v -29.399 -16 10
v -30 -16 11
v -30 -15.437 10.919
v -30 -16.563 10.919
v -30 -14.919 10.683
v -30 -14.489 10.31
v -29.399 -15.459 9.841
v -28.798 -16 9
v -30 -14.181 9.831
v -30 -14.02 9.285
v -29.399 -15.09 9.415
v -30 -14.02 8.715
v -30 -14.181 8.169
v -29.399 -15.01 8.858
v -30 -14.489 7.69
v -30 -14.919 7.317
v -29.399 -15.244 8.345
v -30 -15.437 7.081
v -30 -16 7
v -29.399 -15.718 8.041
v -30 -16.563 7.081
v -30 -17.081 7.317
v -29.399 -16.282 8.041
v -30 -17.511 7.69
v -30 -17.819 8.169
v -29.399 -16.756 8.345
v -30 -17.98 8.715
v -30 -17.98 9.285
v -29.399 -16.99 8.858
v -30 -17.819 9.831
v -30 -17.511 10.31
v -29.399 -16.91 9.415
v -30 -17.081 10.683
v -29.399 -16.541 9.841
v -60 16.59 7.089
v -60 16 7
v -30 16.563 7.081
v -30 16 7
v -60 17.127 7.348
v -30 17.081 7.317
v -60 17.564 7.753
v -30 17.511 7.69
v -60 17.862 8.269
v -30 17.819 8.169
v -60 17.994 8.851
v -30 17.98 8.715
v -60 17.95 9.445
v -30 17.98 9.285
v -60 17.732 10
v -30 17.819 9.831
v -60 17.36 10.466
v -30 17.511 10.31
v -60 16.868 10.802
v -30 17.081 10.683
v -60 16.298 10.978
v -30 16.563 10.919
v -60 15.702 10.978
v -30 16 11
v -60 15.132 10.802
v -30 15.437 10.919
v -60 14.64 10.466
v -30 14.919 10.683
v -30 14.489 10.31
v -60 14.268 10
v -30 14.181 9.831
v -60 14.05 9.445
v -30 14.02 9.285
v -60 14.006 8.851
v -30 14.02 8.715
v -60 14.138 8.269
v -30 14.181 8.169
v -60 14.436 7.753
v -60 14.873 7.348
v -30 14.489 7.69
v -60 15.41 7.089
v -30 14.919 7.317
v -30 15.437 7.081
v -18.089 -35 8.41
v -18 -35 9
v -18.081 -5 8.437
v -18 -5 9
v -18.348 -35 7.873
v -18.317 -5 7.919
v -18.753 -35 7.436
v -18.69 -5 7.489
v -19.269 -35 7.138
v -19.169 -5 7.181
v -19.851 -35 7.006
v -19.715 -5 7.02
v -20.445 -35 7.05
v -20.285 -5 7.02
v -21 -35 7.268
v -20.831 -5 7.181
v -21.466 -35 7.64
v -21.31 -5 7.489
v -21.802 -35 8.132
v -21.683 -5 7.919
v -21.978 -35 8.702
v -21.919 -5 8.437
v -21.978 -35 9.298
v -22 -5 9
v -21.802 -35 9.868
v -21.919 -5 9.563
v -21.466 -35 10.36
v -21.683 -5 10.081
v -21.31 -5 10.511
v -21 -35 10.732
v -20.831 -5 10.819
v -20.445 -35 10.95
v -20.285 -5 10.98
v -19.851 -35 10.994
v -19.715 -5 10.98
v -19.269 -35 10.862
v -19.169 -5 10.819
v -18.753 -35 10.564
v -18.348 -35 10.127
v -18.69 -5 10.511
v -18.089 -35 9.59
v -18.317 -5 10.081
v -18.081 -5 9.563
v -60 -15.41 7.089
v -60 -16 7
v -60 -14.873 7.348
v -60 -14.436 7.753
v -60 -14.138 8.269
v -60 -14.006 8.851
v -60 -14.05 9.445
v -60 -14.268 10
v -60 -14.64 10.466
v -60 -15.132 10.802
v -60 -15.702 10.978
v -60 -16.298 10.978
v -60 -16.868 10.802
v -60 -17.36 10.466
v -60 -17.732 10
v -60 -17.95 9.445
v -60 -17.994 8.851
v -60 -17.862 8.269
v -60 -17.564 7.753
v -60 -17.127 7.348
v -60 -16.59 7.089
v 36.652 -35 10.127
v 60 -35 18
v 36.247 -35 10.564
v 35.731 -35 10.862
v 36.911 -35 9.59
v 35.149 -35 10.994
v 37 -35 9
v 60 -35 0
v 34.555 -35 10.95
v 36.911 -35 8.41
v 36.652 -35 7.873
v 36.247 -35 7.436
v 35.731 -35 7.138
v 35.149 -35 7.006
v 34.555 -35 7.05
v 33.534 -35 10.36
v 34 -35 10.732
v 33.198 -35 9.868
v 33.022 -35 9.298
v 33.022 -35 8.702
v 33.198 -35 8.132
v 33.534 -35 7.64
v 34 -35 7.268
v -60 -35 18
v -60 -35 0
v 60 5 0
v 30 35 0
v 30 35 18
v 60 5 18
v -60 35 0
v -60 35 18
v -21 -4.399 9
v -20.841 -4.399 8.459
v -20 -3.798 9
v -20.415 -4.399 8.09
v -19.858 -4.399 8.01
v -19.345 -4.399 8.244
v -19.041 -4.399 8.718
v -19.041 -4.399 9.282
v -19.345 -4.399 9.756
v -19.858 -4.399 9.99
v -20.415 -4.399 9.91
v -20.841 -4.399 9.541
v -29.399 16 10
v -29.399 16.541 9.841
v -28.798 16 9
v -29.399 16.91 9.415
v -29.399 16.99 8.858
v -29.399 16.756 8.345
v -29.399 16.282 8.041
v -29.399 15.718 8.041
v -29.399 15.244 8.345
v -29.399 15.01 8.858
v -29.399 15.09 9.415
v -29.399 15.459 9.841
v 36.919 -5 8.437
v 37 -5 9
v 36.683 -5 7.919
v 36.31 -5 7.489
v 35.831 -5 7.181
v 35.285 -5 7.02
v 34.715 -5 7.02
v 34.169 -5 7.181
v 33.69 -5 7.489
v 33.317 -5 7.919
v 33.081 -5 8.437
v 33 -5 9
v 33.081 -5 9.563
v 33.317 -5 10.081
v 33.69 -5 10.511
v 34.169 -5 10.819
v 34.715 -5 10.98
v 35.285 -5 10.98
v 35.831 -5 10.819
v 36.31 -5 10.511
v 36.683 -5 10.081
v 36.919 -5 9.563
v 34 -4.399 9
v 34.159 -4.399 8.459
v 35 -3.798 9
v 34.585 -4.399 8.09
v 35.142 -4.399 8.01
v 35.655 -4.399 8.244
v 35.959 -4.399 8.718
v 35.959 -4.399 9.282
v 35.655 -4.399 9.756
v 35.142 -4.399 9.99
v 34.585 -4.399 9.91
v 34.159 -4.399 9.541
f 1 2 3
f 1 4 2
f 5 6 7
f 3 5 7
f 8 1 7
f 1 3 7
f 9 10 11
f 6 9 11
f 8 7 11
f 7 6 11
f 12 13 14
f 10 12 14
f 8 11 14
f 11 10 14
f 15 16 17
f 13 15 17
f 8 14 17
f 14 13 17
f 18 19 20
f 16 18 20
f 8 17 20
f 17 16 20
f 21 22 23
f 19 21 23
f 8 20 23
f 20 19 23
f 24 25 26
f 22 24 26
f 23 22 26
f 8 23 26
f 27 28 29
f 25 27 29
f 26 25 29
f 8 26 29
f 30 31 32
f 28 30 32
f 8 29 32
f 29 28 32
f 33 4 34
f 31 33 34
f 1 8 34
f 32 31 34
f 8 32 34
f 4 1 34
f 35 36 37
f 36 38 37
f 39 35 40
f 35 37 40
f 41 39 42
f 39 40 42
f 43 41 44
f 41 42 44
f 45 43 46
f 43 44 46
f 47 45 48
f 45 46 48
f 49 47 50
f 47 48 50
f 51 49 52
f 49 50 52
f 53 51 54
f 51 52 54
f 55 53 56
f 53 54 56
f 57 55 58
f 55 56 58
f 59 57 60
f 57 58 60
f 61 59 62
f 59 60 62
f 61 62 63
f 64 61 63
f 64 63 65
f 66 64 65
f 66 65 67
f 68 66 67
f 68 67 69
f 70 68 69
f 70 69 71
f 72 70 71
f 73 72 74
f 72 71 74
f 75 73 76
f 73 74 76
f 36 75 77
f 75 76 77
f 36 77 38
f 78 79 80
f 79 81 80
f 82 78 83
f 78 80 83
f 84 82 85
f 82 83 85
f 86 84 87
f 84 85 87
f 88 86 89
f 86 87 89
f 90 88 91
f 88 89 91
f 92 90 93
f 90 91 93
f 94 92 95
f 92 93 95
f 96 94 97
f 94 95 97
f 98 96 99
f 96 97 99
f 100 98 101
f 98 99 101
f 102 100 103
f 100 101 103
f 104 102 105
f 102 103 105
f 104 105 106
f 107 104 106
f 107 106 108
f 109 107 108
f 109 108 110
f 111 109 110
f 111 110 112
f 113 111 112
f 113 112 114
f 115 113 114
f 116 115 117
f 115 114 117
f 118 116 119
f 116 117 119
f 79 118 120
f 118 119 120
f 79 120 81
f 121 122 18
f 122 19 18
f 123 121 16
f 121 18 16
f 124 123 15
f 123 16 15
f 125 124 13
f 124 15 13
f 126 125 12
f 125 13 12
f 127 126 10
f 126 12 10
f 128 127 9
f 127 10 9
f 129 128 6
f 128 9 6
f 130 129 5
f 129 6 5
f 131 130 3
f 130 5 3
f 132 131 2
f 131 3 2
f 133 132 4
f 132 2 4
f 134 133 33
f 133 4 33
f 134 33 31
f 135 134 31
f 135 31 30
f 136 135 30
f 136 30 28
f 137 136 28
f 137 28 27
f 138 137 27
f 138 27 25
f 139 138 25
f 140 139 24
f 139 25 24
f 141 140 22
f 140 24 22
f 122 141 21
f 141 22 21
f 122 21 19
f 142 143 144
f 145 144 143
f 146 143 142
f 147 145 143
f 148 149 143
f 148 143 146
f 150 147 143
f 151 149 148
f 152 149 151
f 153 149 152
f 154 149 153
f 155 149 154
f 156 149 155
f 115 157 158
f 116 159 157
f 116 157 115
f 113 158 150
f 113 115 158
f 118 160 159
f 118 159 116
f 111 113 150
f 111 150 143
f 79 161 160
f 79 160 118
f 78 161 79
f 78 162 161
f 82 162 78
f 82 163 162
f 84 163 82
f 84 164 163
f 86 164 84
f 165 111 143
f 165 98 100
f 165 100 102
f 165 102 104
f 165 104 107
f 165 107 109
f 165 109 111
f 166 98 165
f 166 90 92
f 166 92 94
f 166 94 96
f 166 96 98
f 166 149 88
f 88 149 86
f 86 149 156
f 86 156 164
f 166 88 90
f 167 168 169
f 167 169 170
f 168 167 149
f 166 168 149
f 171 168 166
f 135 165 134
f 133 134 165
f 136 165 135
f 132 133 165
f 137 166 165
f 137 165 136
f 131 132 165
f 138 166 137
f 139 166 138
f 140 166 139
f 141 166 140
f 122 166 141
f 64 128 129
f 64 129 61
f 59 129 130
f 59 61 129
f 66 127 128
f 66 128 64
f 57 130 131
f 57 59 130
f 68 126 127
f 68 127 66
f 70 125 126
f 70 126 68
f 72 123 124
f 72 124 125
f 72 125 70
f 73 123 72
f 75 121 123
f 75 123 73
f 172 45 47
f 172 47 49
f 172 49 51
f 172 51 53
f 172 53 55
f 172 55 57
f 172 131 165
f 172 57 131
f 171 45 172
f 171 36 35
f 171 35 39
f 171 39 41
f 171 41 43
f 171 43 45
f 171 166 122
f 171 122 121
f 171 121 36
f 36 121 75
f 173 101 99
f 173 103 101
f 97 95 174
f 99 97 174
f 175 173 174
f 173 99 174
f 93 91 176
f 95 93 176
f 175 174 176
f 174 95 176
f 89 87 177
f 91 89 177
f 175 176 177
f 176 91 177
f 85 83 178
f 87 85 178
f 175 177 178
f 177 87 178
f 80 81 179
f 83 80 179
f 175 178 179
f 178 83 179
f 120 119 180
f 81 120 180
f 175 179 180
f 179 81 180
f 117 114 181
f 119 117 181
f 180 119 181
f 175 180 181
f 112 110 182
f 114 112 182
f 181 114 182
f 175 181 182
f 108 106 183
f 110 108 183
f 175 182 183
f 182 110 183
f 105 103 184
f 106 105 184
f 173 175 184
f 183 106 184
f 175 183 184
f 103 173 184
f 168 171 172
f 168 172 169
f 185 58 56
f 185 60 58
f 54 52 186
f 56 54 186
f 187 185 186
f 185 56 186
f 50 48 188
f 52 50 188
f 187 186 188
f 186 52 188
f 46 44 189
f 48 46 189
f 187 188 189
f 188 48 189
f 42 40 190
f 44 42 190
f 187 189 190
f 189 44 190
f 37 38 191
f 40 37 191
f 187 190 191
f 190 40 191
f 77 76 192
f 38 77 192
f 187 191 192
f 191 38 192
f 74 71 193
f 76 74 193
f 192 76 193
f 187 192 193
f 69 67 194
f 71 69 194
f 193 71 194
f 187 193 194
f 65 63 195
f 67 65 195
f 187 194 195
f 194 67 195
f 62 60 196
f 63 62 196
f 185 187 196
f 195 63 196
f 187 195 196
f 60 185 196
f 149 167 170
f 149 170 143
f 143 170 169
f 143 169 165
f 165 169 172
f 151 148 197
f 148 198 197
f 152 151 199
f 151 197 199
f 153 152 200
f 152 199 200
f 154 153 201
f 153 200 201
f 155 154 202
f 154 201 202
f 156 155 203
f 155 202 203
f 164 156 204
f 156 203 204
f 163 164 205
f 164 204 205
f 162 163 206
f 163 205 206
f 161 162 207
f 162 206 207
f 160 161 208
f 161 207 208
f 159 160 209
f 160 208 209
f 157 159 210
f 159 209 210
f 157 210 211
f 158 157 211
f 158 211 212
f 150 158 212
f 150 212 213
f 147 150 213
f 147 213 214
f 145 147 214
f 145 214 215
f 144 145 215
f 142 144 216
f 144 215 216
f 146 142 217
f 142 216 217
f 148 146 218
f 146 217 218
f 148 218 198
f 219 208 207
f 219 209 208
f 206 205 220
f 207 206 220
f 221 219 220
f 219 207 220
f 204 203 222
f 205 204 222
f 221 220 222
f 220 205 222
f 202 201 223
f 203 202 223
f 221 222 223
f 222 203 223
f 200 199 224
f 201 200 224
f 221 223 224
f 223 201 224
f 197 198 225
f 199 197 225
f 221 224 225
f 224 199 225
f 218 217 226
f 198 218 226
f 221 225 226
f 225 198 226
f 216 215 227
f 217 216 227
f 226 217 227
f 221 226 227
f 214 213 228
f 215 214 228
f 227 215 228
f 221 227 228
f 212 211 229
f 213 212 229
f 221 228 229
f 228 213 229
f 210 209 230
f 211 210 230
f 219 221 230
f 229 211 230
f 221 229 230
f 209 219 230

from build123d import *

# Parameters (mm, degrees)
BOSS_EXTRUDE1_DEPTH          = 18
F_4_0_4_DIAMETER_HOLE1_D     = 4
F_4_0_4_DIAMETER_HOLE1_DEPTH = 30
F_4_0_4_DIAMETER_HOLE1_TIP   = 1.201721238
F_4_0_4_DIAMETER_HOLE2_D     = 4
F_4_0_4_DIAMETER_HOLE2_DEPTH = 30
F_4_0_4_DIAMETER_HOLE2_TIP   = 1.201721238


with BuildPart() as part:
    # Sketch1 → Boss-Extrude1 (new body)
    with BuildSketch(Plane.XY):
        Polygon((30, 35), (60, 5), (60, -35), (-60, -35), (-60, 35), align=None)
    extrude(amount=BOSS_EXTRUDE1_DEPTH)

    # Ø4.0 (4) Diameter Hole1
    with Locations(Plane.ZY.offset(60)):
        with Locations((9, 16), (9, -16)):
            Hole(F_4_0_4_DIAMETER_HOLE1_D / 2, depth=F_4_0_4_DIAMETER_HOLE1_DEPTH)
            with Locations((0, 0, -(F_4_0_4_DIAMETER_HOLE1_DEPTH + F_4_0_4_DIAMETER_HOLE1_TIP / 2))):  # 118° drill point
                Cone(0, F_4_0_4_DIAMETER_HOLE1_D / 2, F_4_0_4_DIAMETER_HOLE1_TIP, mode=Mode.SUBTRACT)

    # Ø4.0 (4) Diameter Hole2
    with Locations(Plane(origin=(0, -35, 0), x_dir=(-1, 0, 0), z_dir=(0, -1, 0))):
        with Locations((-35, -9), (20, -9)):
            Hole(F_4_0_4_DIAMETER_HOLE2_D / 2, depth=F_4_0_4_DIAMETER_HOLE2_DEPTH)
            with Locations((0, 0, -(F_4_0_4_DIAMETER_HOLE2_DEPTH + F_4_0_4_DIAMETER_HOLE2_TIP / 2))):  # 118° drill point
                Cone(0, F_4_0_4_DIAMETER_HOLE2_D / 2, F_4_0_4_DIAMETER_HOLE2_TIP, mode=Mode.SUBTRACT)


solid = part.part
